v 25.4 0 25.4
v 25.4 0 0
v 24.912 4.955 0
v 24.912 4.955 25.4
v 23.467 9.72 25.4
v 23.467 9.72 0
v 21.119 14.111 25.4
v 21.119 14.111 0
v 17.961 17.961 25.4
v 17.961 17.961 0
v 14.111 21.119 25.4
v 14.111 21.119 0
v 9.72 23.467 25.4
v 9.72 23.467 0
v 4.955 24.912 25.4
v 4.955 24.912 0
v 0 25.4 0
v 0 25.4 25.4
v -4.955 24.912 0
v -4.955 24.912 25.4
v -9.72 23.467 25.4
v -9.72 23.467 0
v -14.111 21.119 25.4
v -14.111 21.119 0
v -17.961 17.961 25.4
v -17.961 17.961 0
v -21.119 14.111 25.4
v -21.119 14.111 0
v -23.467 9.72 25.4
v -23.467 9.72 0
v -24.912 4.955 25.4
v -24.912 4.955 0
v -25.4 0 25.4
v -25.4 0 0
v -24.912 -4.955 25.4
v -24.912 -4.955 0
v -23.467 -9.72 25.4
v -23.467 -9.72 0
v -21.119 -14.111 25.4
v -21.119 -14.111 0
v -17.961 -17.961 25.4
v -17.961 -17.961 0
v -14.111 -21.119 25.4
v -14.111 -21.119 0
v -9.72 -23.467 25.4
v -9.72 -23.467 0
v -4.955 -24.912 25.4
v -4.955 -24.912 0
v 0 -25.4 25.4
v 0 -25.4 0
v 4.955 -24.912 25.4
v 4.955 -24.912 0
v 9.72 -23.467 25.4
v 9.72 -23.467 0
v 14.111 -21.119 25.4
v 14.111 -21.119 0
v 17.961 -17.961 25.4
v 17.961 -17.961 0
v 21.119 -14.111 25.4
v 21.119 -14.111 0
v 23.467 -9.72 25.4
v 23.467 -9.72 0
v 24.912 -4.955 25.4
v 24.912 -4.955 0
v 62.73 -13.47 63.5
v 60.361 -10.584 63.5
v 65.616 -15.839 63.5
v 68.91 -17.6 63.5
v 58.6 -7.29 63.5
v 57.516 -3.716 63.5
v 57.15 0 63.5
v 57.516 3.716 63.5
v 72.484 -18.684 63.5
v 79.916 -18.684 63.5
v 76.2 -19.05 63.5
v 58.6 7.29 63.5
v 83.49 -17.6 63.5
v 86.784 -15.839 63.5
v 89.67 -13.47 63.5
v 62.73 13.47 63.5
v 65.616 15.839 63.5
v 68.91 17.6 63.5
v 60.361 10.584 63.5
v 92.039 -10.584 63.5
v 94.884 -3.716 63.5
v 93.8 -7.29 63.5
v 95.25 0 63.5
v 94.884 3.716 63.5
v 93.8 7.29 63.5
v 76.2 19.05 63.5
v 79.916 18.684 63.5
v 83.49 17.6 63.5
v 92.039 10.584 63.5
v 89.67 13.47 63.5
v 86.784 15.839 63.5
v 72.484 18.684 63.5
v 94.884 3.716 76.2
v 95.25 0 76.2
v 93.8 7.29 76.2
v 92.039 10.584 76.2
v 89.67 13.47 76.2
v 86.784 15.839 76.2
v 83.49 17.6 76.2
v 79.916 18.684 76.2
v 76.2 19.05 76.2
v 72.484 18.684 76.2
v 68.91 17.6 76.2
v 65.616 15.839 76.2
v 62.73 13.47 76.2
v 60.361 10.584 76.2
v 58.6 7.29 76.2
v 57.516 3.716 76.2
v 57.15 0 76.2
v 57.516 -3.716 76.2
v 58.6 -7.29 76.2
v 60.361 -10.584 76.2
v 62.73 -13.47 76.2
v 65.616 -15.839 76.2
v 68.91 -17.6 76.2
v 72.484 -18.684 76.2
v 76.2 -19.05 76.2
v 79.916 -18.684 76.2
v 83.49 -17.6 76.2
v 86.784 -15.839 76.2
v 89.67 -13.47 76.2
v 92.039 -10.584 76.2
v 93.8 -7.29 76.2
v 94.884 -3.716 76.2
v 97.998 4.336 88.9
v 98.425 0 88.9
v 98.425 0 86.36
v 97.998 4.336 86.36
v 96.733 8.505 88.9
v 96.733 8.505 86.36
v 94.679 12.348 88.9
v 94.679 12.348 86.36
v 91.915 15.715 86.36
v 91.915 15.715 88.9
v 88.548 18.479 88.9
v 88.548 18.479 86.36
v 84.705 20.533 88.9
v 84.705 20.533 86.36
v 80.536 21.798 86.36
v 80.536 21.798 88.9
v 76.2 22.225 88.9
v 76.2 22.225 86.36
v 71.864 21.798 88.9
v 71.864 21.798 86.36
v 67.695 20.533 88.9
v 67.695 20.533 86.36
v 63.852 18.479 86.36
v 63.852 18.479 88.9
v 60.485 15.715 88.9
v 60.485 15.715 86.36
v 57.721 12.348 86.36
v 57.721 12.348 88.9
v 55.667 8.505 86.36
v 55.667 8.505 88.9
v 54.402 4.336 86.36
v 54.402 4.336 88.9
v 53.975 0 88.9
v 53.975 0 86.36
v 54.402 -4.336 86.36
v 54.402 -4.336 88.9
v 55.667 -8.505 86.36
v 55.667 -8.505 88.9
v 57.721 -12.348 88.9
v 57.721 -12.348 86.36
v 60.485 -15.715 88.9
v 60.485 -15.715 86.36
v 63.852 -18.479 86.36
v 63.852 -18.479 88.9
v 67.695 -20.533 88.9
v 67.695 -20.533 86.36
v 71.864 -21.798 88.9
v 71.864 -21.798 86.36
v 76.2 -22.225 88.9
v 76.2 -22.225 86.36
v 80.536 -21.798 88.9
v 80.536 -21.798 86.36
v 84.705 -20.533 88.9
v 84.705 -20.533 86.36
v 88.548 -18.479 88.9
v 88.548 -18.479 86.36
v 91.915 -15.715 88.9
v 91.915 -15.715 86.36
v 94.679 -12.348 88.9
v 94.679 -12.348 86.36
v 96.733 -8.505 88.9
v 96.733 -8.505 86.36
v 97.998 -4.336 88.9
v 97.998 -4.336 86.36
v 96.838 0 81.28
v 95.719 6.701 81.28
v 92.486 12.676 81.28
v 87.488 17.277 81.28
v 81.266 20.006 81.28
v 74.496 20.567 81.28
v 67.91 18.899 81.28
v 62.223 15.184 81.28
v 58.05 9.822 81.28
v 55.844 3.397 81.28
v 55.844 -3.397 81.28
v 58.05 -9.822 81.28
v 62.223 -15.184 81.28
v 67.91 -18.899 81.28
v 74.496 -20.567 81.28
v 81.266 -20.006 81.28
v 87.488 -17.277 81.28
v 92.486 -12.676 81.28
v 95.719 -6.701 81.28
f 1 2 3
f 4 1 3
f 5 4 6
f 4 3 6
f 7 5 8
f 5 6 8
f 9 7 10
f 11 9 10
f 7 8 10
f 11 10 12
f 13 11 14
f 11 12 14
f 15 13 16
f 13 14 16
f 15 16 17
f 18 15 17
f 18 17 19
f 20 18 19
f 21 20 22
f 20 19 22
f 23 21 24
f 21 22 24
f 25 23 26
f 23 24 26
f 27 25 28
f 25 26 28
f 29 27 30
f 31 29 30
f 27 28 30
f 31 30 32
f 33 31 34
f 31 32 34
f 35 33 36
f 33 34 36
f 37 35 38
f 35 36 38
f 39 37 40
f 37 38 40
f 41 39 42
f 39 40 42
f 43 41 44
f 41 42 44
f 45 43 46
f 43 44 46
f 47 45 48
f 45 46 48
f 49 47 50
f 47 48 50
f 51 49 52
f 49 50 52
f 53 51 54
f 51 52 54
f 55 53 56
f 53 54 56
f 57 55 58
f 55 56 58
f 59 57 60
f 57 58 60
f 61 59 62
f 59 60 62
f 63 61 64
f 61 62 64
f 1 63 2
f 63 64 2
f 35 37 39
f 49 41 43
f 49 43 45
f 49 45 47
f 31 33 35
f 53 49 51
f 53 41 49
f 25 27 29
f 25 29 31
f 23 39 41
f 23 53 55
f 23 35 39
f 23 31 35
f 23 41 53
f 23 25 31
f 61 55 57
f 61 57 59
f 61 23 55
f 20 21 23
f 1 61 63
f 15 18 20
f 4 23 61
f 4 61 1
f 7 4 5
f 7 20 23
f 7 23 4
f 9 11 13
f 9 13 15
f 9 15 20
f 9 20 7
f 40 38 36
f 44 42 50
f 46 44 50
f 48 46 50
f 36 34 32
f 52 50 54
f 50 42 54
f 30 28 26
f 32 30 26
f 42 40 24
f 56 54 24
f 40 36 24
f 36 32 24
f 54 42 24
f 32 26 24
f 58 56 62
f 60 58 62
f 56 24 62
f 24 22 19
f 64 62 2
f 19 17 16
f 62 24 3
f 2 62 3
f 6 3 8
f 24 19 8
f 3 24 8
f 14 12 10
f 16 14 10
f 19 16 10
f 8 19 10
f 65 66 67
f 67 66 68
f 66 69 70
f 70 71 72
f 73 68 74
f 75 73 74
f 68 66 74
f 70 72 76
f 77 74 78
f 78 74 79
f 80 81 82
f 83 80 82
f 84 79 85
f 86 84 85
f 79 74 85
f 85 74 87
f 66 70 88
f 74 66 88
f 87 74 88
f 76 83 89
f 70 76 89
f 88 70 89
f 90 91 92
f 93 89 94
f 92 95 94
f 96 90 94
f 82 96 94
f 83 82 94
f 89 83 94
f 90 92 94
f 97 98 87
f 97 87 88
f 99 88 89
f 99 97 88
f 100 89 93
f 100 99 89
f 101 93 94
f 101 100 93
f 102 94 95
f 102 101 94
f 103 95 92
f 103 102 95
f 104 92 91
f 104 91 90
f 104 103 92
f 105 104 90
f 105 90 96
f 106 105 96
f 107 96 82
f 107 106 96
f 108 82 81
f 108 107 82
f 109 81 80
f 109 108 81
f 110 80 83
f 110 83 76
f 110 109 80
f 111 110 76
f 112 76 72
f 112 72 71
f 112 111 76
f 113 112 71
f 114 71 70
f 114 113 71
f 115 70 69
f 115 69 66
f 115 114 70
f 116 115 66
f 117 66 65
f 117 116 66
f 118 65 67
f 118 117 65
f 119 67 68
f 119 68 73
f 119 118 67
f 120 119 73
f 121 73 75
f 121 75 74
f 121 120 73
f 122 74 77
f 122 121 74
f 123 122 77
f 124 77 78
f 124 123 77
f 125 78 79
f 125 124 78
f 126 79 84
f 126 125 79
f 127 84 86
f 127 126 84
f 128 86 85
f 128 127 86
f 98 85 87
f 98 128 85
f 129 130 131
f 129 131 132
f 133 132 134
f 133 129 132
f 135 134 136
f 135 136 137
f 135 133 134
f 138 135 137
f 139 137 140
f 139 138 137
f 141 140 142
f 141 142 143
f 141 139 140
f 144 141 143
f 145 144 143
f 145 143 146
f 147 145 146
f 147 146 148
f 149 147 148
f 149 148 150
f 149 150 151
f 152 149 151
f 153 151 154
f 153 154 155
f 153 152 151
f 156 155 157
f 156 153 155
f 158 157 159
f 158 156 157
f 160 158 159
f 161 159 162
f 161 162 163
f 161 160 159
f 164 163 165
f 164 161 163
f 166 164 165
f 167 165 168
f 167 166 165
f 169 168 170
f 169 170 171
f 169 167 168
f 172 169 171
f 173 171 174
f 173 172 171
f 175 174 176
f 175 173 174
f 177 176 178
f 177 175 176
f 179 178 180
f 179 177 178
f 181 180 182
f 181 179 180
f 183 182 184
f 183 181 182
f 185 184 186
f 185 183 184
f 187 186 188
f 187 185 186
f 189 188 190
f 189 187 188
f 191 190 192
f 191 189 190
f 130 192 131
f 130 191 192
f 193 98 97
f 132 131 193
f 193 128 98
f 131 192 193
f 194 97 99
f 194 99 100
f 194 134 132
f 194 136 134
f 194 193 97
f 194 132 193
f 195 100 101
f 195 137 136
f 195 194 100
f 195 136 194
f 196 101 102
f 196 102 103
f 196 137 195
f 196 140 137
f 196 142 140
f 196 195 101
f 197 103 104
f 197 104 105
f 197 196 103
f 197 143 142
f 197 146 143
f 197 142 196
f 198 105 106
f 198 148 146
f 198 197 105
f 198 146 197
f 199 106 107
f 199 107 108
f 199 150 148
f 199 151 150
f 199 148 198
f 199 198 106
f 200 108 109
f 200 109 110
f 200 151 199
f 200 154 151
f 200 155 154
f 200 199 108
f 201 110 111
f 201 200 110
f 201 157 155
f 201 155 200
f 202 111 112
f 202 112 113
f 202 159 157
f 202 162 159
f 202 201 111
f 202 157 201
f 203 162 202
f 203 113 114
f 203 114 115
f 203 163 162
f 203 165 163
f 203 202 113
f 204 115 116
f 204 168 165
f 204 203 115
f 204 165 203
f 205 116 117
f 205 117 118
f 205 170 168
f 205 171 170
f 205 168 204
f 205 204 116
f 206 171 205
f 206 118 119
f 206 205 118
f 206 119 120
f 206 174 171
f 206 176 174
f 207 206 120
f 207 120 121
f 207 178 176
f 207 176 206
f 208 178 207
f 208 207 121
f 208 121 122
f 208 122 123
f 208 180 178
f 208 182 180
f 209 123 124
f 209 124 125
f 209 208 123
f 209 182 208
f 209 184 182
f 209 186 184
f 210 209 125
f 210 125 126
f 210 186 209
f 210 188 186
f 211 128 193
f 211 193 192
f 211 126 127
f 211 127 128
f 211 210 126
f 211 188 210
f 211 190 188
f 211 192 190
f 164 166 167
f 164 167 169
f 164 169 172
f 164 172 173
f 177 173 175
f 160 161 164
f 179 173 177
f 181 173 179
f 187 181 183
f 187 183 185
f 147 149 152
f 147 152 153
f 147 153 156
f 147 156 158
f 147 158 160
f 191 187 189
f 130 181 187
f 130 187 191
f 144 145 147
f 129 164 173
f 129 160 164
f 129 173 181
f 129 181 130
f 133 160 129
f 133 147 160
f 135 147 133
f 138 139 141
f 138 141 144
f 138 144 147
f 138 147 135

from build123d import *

# Parameters (mm, degrees)
F0_R      = 25.4
F1_DEPTH  = 25.4
F3_R      = 19.05
F4_DEPTH  = 12.7
F6_R      = 22.225
F7_DEPTH  = 2.54
F4_FACE_R = 19.05
F7_FACE_R = 22.225


with BuildPart() as f1:
    # F0 (on Top) → F1 (new body)
    with BuildSketch(Plane.XY):
        Circle(F0_R)
    extrude(amount=F1_DEPTH)


with BuildPart() as f4:
    # F3 (on offset) → F4 (new body)
    with BuildSketch(Plane.XY.offset(76.2)):
        with Locations((76.2, 0)):
            Circle(F3_R)
    extrude(amount=-F4_DEPTH)



with BuildPart() as f7:
    # F6 (on offset) → F7 (new body)
    with BuildSketch(Plane.XY.offset(88.9)):
        with Locations((76.2, 0)):
            Circle(F6_R)
    extrude(amount=-F7_DEPTH)


with BuildPart() as f4_1:
    add(f4.part)

    add(f7.part)  # F8 merges F7
    # F4_face (on face) → F8 section 0
    with BuildSketch(Plane(origin=(76.2, 0, 76.2), x_dir=(1, 0, 0), z_dir=(0, 0, 1))):
        Circle(F4_FACE_R)
    # F7_face (on face) → F8 section 1
    with BuildSketch(Plane(origin=(76.2, 0, 86.36), x_dir=(1, 0, 0), z_dir=(0, 0, -1))):
        Circle(F7_FACE_R)
    loft()


solid = Compound([f1.part, f4_1.part])
